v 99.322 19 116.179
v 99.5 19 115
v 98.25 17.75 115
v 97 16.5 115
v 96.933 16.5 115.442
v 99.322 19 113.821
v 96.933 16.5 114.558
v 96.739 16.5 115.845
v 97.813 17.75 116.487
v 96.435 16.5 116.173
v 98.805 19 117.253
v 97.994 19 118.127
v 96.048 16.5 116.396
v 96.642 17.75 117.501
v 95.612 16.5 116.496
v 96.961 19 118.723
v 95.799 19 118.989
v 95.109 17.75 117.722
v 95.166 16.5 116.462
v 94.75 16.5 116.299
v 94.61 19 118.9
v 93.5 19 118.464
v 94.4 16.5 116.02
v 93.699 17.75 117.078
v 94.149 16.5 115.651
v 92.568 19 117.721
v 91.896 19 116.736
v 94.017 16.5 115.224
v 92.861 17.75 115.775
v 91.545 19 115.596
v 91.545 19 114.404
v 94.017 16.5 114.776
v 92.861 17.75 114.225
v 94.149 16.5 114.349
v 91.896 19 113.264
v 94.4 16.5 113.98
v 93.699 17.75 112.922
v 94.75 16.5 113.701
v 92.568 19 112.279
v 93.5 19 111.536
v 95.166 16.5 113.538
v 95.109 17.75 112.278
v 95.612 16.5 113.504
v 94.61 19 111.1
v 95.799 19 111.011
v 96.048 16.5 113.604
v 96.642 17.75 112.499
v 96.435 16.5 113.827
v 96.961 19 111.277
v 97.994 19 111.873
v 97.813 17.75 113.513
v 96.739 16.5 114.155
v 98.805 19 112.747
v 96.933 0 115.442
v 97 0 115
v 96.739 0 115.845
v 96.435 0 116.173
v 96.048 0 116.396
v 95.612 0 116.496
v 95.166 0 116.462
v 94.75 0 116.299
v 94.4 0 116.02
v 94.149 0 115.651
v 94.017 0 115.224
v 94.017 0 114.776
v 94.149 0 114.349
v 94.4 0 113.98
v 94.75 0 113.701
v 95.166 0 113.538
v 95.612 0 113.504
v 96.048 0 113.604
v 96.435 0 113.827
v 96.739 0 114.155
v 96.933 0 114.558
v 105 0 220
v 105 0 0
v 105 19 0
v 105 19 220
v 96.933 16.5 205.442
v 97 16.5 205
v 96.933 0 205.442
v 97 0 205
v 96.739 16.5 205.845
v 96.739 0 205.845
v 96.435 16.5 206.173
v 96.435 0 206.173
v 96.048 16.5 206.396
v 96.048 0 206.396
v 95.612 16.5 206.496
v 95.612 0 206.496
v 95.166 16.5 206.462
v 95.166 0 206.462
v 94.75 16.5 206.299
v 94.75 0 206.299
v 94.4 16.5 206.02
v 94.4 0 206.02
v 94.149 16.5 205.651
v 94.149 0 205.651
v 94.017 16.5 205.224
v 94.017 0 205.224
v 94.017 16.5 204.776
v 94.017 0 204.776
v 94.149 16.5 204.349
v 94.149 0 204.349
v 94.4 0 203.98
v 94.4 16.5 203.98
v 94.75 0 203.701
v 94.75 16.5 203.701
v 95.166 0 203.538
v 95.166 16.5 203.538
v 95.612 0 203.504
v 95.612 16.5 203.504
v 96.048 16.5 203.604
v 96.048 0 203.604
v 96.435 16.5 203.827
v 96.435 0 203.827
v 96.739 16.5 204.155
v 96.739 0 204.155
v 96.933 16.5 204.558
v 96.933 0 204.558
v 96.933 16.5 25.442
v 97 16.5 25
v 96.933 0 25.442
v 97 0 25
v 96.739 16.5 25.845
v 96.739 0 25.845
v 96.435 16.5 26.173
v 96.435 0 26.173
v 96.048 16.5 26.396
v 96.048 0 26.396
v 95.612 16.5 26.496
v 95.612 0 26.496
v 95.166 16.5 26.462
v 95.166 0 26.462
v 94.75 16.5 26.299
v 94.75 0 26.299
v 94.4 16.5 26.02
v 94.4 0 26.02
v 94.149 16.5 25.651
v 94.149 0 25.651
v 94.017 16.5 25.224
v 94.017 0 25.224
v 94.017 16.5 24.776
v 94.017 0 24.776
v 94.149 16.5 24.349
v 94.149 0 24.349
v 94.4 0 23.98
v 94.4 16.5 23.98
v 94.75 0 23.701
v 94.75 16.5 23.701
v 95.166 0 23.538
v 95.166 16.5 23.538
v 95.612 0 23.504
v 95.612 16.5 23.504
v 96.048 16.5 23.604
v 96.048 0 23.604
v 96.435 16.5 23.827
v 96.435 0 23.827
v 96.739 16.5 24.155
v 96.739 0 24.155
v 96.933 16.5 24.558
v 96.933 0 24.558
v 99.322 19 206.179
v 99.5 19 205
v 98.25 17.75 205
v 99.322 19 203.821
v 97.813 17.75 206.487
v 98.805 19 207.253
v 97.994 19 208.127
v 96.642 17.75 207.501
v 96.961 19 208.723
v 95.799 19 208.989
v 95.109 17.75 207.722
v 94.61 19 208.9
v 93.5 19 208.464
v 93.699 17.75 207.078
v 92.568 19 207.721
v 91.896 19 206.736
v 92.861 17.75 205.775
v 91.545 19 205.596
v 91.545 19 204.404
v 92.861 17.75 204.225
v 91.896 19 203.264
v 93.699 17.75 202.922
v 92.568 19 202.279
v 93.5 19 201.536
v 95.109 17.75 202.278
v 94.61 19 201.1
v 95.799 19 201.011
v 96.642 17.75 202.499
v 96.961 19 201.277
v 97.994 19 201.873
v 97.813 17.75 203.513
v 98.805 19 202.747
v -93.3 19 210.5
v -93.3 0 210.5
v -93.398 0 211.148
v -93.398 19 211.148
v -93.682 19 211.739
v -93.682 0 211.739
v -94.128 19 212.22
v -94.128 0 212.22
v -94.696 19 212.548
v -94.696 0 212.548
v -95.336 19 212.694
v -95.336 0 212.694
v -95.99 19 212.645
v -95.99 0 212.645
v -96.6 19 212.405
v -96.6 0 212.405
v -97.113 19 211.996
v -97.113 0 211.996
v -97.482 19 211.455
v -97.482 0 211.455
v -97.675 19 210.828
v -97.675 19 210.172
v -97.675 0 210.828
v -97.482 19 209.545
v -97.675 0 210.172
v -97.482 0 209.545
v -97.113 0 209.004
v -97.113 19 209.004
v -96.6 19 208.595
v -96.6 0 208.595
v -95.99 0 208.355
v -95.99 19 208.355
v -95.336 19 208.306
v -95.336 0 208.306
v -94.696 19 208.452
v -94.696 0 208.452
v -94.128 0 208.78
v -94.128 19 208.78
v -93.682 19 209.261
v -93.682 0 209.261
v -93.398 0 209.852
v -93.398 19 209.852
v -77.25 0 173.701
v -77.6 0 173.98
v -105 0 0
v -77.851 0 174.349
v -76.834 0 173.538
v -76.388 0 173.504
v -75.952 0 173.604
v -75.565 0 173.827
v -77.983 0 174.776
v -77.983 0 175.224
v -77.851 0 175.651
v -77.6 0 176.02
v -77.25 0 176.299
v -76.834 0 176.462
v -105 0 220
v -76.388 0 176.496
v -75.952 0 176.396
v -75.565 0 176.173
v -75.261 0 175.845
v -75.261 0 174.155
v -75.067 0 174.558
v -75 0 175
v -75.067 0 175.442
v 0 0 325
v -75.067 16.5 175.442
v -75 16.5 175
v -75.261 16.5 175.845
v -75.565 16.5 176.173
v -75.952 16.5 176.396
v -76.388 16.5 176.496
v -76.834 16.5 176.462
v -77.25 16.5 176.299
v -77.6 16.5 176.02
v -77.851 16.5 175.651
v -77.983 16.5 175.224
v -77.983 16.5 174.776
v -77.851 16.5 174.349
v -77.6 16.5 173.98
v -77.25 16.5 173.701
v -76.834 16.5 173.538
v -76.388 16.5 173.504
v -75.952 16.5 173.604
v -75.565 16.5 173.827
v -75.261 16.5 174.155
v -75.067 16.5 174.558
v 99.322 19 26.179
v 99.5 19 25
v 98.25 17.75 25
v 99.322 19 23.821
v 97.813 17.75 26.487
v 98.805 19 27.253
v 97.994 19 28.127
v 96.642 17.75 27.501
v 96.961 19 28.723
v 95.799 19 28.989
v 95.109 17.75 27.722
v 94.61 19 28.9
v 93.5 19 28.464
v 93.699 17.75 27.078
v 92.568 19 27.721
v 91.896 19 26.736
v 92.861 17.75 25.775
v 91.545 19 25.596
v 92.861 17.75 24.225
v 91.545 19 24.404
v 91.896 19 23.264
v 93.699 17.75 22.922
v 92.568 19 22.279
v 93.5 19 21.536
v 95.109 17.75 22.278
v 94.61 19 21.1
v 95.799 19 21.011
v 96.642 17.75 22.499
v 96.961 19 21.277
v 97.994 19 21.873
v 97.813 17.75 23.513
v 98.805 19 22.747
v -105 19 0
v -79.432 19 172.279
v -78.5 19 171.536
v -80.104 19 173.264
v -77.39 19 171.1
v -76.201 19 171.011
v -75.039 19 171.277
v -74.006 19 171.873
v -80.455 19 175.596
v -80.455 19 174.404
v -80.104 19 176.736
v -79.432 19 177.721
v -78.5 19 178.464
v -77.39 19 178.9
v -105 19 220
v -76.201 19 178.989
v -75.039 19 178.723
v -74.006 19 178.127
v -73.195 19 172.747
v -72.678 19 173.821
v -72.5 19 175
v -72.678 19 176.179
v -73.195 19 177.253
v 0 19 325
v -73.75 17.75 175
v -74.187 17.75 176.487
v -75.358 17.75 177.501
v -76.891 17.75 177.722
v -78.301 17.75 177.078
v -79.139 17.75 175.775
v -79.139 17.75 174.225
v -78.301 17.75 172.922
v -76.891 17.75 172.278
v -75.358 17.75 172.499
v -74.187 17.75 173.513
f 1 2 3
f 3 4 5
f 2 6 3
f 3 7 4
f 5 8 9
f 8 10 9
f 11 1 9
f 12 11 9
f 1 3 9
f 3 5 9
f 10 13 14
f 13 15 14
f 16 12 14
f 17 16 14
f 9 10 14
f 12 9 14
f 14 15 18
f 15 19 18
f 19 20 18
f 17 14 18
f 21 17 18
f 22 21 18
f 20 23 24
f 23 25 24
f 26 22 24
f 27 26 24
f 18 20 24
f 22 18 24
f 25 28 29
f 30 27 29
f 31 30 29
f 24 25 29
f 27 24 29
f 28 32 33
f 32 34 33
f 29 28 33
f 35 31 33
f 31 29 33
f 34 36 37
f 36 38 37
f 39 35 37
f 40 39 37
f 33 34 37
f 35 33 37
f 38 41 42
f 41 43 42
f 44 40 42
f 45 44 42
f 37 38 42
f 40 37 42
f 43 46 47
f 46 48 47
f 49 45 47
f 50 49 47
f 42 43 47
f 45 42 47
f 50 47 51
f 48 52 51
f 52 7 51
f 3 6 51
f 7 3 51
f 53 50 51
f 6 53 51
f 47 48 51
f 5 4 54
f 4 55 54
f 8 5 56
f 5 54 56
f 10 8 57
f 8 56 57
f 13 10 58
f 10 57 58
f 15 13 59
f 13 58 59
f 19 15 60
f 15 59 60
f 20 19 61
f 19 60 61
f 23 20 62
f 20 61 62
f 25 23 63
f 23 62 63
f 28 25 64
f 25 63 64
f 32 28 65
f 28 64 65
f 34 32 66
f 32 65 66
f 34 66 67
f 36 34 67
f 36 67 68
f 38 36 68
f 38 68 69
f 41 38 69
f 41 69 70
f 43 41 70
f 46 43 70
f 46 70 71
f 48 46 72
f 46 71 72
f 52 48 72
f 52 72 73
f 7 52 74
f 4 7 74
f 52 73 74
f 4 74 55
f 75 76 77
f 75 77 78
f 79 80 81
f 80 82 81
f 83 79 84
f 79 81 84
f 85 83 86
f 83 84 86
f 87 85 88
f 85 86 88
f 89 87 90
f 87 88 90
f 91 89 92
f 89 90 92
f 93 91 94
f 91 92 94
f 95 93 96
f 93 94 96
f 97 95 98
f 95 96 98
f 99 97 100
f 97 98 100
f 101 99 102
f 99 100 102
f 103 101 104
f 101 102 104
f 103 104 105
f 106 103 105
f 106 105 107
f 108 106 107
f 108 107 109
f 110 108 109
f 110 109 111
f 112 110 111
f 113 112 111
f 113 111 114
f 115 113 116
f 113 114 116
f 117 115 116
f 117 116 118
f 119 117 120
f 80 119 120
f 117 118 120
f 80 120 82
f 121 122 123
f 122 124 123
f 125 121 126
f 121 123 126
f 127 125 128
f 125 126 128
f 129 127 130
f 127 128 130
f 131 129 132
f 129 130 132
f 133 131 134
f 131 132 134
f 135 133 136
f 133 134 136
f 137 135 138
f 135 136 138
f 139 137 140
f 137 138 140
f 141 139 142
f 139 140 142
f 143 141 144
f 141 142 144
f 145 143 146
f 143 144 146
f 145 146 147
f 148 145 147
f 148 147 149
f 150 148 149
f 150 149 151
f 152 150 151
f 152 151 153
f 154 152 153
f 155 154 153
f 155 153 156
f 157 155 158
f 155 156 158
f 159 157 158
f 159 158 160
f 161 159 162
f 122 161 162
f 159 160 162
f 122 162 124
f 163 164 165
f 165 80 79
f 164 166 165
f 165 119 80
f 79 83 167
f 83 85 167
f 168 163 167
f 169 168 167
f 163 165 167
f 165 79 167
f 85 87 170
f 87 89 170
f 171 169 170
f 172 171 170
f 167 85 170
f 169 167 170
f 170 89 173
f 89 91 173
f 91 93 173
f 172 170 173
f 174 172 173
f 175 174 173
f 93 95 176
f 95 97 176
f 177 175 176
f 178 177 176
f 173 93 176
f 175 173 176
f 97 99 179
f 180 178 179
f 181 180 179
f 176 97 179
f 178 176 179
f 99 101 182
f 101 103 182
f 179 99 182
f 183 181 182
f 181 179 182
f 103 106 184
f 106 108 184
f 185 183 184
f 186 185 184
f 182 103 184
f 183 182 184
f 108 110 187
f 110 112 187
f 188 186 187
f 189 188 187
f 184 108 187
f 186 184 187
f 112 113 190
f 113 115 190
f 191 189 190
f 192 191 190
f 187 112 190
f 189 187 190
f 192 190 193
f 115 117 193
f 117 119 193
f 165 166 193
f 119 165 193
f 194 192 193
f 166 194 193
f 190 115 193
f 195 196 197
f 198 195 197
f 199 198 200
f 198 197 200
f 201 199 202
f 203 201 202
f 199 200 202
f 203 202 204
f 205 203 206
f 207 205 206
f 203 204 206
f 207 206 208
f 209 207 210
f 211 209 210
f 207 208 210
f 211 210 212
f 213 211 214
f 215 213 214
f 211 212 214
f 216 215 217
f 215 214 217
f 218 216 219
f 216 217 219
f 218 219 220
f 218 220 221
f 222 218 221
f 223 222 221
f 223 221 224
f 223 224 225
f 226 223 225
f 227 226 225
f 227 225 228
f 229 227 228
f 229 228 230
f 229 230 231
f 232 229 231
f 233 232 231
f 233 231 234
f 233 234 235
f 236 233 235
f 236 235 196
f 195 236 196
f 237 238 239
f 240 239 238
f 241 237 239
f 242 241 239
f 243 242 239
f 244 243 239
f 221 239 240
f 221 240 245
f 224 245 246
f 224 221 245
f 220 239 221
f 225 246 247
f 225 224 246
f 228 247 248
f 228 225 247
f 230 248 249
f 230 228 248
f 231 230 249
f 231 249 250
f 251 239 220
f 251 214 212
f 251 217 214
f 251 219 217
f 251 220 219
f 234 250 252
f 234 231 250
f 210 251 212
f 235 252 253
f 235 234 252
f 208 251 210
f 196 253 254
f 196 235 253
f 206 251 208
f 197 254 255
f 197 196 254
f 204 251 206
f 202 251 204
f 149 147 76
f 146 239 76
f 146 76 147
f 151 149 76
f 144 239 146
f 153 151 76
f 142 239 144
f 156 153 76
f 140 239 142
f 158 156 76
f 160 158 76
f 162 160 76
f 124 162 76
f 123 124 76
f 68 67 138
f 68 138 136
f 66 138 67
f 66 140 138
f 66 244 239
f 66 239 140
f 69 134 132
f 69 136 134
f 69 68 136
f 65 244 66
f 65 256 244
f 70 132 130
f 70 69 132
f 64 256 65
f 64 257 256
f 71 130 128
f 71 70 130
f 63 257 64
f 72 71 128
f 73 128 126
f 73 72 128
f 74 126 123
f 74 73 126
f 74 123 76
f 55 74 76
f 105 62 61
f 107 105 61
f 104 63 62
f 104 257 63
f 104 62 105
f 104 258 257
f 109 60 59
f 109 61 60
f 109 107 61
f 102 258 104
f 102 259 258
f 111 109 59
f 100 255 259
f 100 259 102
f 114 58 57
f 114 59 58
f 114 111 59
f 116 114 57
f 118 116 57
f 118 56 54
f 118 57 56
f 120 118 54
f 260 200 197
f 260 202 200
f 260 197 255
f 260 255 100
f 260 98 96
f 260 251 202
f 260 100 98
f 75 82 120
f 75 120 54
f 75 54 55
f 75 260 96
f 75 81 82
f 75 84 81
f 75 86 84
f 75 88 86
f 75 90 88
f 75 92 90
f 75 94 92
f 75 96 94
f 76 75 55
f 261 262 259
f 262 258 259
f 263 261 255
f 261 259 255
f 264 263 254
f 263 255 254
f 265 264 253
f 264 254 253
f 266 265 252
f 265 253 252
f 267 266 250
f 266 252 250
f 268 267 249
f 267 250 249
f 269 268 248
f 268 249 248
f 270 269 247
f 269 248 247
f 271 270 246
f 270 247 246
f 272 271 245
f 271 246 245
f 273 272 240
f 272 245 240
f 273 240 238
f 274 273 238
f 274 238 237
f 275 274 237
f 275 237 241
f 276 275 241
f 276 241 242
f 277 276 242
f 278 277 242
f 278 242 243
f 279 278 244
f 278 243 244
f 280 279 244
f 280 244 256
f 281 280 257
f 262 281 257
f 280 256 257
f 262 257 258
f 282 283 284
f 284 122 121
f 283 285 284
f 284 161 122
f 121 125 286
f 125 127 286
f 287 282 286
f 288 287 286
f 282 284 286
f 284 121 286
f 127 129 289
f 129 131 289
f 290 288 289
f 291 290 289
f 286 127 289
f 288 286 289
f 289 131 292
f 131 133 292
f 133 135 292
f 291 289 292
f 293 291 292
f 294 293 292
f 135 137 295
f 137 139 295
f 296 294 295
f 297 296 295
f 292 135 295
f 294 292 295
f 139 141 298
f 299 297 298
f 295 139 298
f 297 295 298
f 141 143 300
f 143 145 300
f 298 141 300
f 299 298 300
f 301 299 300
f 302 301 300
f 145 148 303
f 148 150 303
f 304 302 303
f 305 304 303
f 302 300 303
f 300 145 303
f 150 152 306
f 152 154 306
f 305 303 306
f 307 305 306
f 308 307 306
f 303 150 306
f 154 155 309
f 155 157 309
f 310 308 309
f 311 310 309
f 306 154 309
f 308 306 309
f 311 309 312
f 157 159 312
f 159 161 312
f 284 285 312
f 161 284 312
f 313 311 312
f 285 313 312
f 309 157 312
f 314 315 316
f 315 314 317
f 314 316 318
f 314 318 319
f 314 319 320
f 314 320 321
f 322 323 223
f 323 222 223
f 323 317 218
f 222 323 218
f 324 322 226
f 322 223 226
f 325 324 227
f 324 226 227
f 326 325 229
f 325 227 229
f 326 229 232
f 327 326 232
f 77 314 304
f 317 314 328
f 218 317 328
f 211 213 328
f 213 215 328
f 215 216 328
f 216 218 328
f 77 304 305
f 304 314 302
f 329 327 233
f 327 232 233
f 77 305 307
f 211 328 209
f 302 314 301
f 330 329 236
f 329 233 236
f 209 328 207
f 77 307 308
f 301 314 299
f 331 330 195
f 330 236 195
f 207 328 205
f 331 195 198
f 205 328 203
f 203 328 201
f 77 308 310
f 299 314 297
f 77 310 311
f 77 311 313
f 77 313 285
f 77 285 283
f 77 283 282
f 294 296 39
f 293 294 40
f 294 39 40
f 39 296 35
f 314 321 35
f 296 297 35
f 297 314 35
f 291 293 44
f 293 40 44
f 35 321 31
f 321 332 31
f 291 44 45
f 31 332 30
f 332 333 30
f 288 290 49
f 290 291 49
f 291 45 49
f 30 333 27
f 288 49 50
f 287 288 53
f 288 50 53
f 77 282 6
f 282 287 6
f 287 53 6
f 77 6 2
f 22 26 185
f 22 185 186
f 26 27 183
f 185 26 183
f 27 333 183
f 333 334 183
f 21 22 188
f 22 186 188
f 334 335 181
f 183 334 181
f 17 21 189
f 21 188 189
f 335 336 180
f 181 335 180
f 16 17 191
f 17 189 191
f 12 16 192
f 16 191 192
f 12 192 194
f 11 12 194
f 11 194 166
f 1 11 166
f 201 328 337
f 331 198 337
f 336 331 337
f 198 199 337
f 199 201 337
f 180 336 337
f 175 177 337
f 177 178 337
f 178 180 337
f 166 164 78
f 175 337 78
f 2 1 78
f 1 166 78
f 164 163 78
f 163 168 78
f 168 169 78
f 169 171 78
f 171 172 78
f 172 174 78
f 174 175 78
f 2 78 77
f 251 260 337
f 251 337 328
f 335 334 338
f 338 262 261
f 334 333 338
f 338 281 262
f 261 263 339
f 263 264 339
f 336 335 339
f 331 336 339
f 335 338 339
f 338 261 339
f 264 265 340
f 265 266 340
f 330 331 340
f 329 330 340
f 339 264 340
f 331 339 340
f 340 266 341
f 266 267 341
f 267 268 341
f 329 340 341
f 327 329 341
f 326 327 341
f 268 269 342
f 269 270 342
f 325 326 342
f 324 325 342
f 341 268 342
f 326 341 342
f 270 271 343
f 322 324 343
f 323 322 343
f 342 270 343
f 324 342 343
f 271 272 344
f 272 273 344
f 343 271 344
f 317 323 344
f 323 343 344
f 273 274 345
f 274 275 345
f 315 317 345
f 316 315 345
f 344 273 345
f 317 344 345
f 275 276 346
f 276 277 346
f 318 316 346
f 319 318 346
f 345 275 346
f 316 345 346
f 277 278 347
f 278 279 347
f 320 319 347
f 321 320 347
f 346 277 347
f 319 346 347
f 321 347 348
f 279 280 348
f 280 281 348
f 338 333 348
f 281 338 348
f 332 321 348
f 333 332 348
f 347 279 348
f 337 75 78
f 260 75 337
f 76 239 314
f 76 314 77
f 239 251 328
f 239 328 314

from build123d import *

# Parameters (mm, degrees)
F1_DEPTH       = 19
F3_D           = 3
F3_CSINK_D     = 8
F3_CSINK_ANGLE = 90
F4_D           = 4.4


with BuildPart() as f1:
    # F0 (on Front) → F1 (new body)
    with BuildSketch(Plane.XZ):
        Polygon((-105, 0), (105, 0), (105, 220), (0, 325), (-105, 220), align=None)
    extrude(amount=-F1_DEPTH)

    # F3 (through all)
    with Locations(Plane(origin=(0, 19, 0), x_dir=(-1, 0, 0), z_dir=(0, 1, 0))):
        with Locations((-95.5, 25), (-95.5, 115), (-95.5, 205), (76.5, 175)):
            CounterSinkHole(F3_D / 2, F3_CSINK_D / 2, counter_sink_angle=F3_CSINK_ANGLE)

    # F4 (through all)
    with Locations(Plane(origin=(0, 19, 0), x_dir=(-1, 0, 0), z_dir=(0, 1, 0))):
        with Locations((95.5, 210.5)):
            Hole(F4_D / 2)


solid = f1.part
